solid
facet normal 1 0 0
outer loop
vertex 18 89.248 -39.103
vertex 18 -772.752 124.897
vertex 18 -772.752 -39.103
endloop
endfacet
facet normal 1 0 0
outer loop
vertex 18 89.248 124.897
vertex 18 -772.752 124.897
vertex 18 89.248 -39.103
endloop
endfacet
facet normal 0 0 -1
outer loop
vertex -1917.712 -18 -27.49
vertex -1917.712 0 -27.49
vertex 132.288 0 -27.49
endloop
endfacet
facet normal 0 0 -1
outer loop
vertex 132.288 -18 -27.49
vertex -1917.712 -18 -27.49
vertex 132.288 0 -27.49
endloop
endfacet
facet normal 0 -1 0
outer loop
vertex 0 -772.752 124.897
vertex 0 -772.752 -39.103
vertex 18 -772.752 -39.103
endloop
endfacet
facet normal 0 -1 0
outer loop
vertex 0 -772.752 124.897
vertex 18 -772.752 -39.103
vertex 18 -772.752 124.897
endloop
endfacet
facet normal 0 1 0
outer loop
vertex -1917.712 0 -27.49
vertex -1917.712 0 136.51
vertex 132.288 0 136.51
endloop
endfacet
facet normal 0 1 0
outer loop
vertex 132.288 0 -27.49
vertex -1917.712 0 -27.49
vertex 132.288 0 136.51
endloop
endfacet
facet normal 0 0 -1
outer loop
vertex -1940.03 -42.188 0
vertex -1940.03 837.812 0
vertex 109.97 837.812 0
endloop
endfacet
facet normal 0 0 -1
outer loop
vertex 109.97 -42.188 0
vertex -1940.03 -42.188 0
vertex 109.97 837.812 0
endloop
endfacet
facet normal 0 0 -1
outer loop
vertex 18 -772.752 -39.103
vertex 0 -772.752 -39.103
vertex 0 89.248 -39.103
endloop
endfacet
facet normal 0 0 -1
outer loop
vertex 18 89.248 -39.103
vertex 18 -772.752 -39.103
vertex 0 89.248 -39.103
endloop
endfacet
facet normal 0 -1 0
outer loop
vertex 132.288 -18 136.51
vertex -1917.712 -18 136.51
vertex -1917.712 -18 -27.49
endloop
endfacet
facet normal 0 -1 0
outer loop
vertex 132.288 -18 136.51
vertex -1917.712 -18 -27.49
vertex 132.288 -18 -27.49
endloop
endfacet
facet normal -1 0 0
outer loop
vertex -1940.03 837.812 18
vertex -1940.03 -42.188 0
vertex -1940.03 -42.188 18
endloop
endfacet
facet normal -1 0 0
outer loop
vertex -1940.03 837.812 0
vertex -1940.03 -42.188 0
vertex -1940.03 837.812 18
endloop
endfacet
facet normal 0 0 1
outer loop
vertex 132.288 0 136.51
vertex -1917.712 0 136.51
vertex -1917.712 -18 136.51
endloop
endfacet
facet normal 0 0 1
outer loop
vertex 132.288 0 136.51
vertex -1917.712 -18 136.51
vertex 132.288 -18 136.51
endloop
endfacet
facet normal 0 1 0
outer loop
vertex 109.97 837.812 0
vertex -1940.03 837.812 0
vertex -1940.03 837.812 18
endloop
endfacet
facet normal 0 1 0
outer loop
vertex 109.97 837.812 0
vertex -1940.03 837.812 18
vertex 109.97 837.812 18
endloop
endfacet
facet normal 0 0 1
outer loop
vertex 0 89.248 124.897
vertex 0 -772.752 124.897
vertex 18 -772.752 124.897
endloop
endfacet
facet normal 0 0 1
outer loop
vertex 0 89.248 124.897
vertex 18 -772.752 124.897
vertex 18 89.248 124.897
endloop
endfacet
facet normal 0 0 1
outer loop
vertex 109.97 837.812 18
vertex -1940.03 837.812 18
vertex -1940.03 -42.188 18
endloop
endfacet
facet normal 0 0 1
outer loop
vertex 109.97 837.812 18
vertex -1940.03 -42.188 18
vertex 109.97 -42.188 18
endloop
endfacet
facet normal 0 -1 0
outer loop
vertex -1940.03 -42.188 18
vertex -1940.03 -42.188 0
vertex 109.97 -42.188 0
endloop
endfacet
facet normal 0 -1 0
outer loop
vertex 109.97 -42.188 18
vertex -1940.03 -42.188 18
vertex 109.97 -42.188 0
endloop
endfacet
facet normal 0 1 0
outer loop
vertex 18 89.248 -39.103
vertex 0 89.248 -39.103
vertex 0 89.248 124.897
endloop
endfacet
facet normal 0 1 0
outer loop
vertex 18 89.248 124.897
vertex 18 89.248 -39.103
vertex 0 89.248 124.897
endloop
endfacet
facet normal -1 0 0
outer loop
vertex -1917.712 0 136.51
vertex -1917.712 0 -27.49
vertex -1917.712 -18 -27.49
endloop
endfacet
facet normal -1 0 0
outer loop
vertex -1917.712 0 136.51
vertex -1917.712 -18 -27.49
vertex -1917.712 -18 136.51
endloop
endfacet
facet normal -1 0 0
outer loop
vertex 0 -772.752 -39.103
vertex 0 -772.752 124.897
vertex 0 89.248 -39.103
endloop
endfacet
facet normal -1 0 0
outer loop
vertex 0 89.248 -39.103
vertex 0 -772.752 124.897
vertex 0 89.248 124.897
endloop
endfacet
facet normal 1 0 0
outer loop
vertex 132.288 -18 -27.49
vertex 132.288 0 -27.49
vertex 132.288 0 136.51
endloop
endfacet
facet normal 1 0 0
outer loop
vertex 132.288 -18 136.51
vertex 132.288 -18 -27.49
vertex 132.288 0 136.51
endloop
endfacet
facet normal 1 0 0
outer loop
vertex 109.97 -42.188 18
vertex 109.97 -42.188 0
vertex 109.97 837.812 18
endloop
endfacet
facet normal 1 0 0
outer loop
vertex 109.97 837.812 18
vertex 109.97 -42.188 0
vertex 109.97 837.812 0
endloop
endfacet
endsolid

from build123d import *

# Parameters (mm, degrees)
F0_W     = 2050
F0_H     = 880
F1_DEPTH = 18
F2_W     = 2050
F2_H     = 164
F3_DEPTH = 18
F4_W     = 862
F4_H     = 164
F5_DEPTH = 18


with BuildPart() as f1:
    # F0 (on Top) → F1 (new body)
    with BuildSketch(Plane.XY):
        with Locations((-915.03024, 397.812499)):
            Rectangle(F0_W, F0_H)
    extrude(amount=F1_DEPTH)


with BuildPart() as f3:
    # F2 (on Front) → F3 (new body)
    with BuildSketch(Plane.XZ):
        with Locations((-892.71169, 54.510081)):
            Rectangle(F2_W, F2_H)
    extrude(amount=F3_DEPTH)


with BuildPart() as f5:
    # F4 (on Right) → F5 (new body)
    with BuildSketch(Plane.YZ):
        with Locations((-341.752011, 42.897177)):
            Rectangle(F4_W, F4_H)
    extrude(amount=F5_DEPTH)


solid = Compound([f1.part, f3.part, f5.part])
